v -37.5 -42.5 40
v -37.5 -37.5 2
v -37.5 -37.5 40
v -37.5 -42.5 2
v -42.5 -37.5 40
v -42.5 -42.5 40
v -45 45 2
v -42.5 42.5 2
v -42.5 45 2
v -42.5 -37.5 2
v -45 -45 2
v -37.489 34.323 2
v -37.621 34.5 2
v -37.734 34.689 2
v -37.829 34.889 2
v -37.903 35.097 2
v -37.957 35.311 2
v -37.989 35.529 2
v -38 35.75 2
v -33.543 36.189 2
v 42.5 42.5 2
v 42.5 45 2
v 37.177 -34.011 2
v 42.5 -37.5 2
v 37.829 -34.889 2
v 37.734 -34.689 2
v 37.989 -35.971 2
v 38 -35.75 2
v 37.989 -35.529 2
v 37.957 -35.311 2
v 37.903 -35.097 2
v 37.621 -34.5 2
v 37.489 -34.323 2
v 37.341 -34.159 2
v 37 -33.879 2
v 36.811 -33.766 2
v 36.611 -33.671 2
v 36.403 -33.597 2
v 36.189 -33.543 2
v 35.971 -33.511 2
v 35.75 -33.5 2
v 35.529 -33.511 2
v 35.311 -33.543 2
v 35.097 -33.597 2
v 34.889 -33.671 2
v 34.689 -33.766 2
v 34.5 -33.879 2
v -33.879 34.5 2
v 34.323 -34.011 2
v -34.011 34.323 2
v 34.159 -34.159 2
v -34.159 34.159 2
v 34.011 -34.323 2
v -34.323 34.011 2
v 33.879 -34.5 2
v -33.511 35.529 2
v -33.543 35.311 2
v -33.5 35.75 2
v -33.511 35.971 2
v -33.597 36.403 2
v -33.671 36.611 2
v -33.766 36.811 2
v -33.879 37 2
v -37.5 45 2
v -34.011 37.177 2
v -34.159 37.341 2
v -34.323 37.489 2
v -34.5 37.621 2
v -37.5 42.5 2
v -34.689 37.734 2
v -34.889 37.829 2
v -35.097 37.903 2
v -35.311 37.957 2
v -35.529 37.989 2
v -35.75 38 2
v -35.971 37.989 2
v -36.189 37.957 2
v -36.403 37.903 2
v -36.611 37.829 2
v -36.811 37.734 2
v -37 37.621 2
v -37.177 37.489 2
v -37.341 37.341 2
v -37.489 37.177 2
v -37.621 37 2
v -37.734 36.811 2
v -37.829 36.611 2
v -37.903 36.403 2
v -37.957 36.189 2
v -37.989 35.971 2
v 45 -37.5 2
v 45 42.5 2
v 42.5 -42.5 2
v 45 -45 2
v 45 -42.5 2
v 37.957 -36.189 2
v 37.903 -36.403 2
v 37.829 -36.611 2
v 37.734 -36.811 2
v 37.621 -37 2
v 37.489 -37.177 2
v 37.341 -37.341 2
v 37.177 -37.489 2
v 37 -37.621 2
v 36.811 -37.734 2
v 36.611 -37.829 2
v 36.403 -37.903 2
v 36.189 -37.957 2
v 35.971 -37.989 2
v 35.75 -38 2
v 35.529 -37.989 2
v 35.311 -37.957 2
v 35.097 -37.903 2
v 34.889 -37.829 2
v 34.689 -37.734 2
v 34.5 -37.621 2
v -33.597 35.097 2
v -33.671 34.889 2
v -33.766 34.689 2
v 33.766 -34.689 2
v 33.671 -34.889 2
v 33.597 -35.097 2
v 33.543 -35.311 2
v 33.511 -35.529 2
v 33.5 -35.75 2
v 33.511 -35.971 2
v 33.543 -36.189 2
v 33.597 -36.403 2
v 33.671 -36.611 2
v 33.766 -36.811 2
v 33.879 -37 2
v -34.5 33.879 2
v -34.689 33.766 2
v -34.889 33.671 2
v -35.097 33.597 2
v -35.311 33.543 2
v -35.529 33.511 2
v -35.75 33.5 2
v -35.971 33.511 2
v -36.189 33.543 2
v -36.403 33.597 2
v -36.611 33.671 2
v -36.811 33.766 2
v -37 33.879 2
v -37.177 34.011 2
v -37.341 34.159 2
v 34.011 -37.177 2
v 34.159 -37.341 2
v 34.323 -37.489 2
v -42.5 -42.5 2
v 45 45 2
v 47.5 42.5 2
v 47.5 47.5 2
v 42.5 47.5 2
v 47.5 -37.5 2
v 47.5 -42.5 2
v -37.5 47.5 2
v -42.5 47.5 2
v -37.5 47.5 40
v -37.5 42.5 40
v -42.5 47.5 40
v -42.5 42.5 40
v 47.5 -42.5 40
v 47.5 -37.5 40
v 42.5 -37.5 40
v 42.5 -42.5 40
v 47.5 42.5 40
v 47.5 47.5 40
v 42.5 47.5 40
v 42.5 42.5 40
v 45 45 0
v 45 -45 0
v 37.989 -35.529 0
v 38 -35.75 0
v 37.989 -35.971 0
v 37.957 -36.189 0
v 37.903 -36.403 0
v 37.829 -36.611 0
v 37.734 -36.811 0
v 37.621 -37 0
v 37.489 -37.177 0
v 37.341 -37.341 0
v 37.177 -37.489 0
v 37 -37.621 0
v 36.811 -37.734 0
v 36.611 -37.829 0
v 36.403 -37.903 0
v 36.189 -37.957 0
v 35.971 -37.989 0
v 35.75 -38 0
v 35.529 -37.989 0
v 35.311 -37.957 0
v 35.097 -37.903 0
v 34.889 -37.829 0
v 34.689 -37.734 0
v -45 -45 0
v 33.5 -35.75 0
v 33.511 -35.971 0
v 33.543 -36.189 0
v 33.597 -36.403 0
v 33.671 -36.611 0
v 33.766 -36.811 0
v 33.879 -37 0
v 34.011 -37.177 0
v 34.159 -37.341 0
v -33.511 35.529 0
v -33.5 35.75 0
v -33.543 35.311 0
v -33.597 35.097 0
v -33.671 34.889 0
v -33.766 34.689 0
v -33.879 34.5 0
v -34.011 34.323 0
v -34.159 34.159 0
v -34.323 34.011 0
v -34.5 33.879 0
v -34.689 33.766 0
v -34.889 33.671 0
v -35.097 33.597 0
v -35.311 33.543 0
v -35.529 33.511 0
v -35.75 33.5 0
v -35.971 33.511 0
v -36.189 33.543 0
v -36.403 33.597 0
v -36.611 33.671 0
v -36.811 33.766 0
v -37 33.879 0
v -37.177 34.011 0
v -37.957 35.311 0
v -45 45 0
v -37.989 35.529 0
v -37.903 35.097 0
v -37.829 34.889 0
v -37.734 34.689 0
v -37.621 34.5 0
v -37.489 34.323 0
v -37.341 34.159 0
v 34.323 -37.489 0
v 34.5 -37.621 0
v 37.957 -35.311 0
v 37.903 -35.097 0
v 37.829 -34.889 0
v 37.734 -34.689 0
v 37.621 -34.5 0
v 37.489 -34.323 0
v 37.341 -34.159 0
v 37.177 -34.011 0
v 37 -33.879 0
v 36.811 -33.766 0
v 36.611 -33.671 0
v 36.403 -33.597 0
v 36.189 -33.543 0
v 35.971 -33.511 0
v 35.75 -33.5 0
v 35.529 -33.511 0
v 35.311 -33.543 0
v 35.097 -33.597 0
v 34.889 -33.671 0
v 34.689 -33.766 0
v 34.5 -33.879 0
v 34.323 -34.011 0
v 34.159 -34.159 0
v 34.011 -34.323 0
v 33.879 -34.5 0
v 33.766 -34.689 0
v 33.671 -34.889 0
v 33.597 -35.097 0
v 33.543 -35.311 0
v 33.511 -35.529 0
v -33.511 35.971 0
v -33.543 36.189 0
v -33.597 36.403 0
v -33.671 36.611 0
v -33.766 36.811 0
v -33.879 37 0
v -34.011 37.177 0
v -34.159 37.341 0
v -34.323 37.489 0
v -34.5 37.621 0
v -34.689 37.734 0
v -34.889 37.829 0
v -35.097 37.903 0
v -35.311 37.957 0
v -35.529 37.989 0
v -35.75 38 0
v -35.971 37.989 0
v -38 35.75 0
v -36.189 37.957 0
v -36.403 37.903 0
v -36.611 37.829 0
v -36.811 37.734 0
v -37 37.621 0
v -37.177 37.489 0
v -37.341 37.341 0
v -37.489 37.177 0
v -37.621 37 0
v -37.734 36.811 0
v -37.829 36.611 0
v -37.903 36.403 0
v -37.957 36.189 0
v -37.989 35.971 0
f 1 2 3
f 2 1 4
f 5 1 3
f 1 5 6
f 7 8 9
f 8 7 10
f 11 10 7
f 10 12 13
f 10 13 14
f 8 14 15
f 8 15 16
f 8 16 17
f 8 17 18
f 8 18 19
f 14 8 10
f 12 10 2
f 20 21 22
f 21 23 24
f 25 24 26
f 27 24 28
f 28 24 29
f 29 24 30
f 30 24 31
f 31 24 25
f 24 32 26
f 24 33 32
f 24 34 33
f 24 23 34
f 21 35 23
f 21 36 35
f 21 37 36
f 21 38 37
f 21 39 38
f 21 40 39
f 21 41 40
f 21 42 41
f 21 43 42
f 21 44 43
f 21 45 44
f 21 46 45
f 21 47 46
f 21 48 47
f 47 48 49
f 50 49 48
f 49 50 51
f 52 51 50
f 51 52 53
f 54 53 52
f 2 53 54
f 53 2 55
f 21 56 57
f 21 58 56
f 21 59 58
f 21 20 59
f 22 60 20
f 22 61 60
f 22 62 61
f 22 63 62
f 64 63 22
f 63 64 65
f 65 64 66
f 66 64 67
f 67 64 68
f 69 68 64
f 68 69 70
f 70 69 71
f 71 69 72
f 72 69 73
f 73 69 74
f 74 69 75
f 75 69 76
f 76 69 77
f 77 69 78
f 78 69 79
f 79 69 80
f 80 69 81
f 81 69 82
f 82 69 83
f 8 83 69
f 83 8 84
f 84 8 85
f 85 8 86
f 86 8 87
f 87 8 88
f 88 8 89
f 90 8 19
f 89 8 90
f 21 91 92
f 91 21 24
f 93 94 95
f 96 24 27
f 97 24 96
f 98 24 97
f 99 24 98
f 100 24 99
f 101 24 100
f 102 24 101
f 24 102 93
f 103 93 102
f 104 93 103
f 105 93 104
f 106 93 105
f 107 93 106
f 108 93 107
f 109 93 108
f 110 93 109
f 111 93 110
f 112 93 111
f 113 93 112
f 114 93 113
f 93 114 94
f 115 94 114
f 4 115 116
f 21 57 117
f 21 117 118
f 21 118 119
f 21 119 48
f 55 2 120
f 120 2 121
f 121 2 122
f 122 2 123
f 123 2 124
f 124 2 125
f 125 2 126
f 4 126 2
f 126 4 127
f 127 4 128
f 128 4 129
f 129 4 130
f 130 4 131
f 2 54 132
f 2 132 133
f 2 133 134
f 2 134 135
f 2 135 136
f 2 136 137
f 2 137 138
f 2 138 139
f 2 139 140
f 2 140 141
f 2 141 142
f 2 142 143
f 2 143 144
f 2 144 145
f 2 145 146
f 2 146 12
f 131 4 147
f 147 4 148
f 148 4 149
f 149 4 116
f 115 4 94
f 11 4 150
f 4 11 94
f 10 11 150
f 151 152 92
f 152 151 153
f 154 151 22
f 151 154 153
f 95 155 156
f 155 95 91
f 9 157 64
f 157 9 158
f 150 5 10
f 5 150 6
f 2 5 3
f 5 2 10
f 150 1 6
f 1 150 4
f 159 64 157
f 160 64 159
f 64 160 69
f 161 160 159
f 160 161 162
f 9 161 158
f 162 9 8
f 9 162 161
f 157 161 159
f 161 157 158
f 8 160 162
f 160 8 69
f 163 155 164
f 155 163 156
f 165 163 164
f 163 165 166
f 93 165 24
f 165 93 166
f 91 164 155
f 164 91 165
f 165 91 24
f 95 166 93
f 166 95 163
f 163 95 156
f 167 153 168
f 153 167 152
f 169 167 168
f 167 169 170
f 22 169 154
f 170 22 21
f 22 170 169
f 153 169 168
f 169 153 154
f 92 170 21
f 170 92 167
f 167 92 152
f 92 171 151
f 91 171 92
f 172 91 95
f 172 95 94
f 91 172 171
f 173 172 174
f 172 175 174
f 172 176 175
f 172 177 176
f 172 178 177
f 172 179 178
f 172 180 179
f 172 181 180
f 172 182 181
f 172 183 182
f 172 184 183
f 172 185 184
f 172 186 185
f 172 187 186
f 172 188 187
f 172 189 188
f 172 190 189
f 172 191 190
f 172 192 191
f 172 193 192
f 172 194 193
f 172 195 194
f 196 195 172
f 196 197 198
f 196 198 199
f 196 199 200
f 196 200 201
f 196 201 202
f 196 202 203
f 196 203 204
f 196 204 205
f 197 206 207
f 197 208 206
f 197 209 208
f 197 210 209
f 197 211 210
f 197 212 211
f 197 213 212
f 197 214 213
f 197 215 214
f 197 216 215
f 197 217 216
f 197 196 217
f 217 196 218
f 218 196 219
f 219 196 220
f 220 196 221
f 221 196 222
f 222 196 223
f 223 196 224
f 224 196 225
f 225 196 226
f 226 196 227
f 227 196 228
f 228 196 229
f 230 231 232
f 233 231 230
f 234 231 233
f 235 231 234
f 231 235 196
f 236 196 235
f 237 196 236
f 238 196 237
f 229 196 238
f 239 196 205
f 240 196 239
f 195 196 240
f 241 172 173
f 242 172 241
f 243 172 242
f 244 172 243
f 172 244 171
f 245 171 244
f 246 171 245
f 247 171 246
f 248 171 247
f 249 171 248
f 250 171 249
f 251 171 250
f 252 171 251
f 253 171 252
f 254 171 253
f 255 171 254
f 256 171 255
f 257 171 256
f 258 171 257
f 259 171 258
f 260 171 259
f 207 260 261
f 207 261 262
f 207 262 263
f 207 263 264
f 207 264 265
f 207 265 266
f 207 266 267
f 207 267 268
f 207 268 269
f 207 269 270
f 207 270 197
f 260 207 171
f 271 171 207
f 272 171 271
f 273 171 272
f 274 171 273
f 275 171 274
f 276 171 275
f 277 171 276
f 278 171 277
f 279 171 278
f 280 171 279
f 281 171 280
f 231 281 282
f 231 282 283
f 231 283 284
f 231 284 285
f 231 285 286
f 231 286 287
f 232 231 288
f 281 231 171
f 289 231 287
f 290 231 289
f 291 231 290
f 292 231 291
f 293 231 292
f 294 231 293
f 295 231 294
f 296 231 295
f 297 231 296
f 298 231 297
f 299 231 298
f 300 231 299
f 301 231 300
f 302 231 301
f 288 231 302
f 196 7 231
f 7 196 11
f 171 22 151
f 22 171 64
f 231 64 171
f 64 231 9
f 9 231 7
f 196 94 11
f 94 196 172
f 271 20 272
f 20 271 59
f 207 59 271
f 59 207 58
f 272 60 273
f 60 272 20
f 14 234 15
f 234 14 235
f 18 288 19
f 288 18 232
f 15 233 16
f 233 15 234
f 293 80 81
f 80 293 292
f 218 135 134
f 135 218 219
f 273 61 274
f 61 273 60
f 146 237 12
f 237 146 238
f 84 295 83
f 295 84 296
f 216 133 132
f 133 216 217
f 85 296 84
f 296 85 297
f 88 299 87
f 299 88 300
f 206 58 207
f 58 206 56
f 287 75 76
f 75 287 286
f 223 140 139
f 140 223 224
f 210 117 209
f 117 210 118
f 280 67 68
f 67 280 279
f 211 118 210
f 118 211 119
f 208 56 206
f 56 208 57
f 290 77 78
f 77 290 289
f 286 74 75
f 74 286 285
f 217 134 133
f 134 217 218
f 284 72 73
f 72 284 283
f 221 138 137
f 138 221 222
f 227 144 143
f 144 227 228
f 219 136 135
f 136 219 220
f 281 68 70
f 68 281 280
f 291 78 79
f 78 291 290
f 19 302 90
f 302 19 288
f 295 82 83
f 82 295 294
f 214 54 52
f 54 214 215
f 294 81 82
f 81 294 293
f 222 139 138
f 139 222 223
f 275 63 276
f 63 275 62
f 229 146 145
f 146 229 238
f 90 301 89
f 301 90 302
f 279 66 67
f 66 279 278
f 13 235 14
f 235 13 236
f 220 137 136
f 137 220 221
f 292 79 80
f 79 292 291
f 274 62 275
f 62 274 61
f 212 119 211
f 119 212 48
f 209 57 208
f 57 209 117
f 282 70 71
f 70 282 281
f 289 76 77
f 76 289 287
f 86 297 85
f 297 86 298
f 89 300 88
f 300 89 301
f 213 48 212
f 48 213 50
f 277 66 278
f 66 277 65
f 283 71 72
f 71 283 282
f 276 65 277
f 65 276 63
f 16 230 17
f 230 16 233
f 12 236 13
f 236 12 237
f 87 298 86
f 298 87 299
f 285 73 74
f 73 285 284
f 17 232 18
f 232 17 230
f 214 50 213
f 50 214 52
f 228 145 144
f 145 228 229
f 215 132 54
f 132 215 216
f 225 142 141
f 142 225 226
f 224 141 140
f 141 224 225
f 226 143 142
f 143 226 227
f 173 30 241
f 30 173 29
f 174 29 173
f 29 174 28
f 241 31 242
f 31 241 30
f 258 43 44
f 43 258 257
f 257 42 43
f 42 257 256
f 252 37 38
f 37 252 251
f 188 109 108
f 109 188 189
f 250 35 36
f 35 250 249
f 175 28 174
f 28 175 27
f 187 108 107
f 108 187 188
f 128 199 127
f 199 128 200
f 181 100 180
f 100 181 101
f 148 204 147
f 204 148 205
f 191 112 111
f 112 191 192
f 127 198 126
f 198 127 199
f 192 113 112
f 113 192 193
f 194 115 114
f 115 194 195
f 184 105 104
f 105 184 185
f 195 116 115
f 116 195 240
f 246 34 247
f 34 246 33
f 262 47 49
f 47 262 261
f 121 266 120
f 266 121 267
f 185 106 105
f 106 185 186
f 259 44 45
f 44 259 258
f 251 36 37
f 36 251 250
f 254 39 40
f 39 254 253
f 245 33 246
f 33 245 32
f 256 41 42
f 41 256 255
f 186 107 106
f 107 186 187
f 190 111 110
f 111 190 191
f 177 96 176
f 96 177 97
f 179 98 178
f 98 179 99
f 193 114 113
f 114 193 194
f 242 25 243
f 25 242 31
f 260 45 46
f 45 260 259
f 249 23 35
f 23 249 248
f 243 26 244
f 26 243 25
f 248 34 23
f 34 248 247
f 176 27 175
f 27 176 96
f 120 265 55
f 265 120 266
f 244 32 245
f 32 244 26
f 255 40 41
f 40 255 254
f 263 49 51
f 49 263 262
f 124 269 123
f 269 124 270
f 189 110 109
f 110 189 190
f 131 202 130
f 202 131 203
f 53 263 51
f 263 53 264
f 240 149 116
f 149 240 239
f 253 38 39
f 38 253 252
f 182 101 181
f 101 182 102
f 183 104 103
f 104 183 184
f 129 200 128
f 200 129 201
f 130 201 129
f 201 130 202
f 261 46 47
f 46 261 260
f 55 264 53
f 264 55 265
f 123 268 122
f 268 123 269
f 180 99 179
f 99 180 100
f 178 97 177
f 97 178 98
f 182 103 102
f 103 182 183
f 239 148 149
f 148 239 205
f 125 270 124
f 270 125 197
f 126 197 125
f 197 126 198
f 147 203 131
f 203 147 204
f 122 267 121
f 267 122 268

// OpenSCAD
// DIY magnetic stirrer housing - 80 mm PC case fan adapter
// Print orientation: top plate down on bed, open box up (+Z)

$fn = 64;

// ---- Dimensions (mm) ----
outer_size    = 90;    // outer X and Y
top_plate_t   = 2;     // top plate thickness (z = 0 to 2)
wall_t        = 2.5;   // wall thickness
box_h         = 40;    // open top height (z = 0 to 40)
screw_d       = 4.5;   // M4 screw hole diameter
screw_pitch   = 71.5;  // square pattern side for screw holes
notch_w       = 12;    // cable notch width
notch_depth   = 8;     // cable notch depth from open edge (z = 32 to 40)
eps           = 0.5;   // cutter overshoot

difference() {
    union() {
        // Top plate
        translate([-outer_size/2, -outer_size/2, 0])
            cube([outer_size, outer_size, top_plate_t]);

        // Four walls from top plate up to open top
        for (sx = [-1, 1], sy = [-1, 1])
            translate([sx * (outer_size/2 - wall_t), sy * (outer_size/2 - wall_t), top_plate_t])
                cube([2 * wall_t, 2 * wall_t, box_h - top_plate_t]);
    }

    // Screw holes through top plate on 71.5 mm square pattern
    for (i = [0 : 3]) {
        x = (i - 1.5) * screw_pitch;
        y = (i % 2 - 0.5) * screw_pitch;
        translate([x, y, -eps])
            cylinder(d = screw_d, h = top_plate_t + 2 * eps);
    }

    // Cable notch in one wall, 12 mm wide, reaching 8 mm down from open edge
    translate([outer_size/2 - wall_t - notch_w/2, -notch_w/2, box_h - notch_depth])
        cube([notch_w, notch_w, notch_depth + eps]);
}
